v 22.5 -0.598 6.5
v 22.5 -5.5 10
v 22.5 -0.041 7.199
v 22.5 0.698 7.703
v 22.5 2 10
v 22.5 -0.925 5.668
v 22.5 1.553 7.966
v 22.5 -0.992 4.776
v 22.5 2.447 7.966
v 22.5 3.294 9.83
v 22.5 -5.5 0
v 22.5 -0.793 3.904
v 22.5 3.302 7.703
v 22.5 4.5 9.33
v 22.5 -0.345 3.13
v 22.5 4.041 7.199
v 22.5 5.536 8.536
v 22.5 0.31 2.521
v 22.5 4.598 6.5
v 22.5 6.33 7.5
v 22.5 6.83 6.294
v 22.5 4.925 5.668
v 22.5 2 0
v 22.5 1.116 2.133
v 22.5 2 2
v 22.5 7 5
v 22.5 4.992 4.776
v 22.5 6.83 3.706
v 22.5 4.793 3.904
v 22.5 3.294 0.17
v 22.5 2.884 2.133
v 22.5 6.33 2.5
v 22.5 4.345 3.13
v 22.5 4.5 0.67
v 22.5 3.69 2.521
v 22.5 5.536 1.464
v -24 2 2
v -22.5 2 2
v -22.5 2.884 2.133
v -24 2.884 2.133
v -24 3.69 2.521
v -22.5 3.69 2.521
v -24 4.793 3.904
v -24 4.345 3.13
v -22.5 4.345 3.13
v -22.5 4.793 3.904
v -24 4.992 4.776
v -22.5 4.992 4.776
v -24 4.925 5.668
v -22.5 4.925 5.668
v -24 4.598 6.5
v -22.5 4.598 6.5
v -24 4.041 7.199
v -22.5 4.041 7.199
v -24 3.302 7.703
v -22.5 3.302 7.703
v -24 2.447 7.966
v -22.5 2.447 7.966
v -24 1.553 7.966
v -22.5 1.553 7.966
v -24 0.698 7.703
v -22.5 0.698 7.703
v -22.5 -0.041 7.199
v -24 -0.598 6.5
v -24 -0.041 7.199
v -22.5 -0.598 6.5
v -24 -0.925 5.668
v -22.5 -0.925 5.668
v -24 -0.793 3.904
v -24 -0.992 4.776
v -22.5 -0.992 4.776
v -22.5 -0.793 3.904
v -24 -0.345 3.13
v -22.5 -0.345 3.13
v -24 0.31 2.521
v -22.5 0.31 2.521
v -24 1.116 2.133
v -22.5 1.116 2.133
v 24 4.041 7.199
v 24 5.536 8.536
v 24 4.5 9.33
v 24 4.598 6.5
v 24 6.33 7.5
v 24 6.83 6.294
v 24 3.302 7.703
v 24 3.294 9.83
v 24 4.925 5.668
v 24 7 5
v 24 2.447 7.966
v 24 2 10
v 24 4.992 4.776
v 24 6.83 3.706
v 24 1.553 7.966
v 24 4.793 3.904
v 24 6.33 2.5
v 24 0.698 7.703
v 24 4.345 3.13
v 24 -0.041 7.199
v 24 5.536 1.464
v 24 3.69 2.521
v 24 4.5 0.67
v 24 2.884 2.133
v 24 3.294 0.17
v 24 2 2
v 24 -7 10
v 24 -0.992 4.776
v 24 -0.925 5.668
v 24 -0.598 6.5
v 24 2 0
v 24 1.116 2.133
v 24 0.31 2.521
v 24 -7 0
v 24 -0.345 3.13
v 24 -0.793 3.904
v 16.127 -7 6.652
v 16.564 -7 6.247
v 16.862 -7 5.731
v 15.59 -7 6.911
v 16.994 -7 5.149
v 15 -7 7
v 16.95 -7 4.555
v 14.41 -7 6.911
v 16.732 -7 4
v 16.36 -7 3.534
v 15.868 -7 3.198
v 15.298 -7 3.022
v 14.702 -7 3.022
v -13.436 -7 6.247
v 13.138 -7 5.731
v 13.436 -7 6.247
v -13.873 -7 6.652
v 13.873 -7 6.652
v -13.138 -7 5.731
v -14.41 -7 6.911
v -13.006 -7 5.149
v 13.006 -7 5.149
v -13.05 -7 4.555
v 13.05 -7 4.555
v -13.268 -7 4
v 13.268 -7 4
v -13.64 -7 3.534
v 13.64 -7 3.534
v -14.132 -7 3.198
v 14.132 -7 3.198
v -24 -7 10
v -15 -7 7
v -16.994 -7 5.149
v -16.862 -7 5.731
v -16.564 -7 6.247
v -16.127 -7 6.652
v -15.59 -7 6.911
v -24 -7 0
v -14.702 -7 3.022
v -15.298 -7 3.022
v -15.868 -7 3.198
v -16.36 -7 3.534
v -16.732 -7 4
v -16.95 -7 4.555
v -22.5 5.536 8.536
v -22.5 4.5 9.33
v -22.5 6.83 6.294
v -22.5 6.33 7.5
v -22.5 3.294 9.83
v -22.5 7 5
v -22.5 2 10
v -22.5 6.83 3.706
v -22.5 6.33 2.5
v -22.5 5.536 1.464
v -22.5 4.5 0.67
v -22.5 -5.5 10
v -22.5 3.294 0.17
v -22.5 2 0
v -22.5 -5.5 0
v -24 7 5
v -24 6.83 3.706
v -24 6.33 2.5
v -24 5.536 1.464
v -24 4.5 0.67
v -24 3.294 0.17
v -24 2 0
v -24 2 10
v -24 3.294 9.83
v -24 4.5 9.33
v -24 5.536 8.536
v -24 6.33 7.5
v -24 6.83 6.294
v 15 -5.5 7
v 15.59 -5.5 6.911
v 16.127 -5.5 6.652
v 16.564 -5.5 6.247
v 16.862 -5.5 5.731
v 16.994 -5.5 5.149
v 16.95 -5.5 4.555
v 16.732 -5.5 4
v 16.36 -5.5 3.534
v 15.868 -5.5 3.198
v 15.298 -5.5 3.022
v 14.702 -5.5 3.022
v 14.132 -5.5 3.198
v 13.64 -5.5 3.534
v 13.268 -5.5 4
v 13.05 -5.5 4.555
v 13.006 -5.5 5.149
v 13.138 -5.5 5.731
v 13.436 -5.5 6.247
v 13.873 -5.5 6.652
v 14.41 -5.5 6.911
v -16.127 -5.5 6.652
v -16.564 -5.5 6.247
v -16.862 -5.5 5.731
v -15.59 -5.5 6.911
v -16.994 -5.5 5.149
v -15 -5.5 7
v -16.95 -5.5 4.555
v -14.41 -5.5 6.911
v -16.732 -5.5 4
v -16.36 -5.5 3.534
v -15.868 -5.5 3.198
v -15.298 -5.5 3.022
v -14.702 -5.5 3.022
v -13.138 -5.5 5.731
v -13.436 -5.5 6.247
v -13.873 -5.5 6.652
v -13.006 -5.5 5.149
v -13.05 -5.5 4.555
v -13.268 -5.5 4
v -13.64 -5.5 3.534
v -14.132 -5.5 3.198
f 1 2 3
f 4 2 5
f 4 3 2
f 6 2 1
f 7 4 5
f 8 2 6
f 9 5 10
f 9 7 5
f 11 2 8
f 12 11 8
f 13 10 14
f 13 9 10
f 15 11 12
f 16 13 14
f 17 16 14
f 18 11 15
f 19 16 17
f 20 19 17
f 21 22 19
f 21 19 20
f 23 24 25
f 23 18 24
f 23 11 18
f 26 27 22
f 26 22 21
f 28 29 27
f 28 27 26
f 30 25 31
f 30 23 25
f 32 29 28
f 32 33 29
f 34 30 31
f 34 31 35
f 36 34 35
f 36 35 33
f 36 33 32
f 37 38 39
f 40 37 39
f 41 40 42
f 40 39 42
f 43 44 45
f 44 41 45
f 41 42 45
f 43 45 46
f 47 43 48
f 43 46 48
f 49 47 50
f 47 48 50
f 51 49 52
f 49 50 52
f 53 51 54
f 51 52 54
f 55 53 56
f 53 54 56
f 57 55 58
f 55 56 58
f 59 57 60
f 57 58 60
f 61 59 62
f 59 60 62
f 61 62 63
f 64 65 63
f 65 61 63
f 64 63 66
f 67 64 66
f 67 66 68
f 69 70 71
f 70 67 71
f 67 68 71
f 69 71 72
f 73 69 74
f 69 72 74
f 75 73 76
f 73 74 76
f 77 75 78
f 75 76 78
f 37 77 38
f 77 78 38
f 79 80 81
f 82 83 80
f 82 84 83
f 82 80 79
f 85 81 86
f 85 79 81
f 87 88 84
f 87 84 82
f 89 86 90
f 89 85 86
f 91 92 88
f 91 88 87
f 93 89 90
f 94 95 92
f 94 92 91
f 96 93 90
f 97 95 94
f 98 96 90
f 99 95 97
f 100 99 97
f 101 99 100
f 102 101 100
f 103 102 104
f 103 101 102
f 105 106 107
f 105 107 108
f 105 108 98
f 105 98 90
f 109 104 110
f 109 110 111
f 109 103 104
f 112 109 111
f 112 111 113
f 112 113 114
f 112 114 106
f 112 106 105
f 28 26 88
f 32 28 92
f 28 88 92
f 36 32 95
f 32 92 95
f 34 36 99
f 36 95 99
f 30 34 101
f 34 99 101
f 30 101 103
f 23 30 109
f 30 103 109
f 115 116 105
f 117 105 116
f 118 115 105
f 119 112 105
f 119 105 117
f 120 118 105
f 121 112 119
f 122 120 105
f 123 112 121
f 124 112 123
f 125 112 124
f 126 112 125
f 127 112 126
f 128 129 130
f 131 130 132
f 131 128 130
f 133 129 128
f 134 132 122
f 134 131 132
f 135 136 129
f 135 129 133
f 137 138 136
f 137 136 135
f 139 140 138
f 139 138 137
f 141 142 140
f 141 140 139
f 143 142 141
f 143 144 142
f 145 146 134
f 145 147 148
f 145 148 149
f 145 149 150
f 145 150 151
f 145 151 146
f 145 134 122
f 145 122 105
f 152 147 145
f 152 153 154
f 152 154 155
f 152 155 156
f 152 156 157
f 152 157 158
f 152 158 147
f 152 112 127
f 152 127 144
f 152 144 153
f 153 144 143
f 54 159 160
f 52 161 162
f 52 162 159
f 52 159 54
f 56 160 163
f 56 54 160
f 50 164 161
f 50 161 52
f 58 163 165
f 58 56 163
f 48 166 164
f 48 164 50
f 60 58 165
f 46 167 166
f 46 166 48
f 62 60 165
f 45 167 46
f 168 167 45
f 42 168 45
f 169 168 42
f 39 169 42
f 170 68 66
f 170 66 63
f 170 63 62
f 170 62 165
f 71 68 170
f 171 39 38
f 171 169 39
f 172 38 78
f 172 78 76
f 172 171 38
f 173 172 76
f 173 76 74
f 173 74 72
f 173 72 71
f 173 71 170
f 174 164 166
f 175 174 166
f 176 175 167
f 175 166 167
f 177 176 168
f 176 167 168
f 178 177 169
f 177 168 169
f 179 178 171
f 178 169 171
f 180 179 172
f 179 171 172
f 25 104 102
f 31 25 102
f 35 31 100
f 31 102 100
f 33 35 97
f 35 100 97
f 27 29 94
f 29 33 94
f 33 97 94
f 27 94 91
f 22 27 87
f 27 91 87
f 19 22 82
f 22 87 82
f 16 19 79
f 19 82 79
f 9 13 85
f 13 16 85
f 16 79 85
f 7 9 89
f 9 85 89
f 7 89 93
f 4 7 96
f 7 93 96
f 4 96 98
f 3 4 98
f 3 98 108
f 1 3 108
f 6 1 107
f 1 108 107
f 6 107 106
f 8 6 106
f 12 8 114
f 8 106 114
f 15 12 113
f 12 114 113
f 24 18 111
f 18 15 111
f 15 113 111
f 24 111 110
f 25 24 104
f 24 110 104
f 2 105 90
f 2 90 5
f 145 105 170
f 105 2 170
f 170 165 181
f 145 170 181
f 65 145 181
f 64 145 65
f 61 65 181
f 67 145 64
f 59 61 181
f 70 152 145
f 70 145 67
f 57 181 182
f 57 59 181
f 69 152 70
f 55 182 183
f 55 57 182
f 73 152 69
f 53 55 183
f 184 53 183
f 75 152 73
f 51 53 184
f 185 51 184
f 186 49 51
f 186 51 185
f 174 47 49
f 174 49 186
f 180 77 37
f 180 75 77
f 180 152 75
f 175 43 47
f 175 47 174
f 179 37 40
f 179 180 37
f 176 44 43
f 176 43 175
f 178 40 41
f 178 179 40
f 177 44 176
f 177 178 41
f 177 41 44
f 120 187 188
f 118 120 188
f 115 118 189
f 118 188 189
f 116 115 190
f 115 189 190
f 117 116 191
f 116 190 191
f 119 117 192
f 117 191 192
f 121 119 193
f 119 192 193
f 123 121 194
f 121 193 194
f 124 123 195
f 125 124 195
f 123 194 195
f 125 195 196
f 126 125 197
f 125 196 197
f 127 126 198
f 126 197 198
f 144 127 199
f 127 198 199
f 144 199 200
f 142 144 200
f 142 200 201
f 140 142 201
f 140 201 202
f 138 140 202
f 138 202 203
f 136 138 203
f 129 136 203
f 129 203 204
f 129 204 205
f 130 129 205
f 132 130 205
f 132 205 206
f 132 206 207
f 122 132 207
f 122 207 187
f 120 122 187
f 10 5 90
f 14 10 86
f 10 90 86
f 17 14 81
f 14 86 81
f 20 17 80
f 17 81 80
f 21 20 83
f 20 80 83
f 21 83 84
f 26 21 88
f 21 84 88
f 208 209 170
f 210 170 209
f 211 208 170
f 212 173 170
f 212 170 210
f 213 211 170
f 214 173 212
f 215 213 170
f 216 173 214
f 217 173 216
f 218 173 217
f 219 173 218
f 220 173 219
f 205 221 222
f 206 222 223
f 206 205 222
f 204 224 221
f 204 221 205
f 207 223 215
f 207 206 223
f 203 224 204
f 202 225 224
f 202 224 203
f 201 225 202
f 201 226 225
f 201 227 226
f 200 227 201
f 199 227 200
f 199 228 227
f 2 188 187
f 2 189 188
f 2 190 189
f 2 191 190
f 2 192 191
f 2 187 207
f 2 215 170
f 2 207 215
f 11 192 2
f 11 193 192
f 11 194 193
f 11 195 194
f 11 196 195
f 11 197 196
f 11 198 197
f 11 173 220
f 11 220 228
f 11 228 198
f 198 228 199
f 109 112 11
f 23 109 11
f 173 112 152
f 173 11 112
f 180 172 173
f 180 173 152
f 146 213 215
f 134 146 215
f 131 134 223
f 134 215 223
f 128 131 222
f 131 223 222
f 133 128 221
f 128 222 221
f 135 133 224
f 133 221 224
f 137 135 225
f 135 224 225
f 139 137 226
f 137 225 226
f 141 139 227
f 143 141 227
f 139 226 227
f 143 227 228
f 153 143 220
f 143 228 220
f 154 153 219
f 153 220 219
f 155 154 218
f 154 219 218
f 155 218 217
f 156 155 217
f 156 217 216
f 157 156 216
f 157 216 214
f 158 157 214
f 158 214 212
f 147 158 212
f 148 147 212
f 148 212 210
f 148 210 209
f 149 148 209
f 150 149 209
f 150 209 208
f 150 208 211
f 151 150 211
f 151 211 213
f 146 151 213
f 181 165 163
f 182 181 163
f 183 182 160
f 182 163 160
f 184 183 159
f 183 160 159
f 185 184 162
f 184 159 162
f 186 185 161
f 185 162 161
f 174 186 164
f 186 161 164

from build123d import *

# Parameters (mm, degrees)
BOSS_EXTRUDE1_DEPTH = 10
CUT_EXTRUDE1_REACH  = 51.528
SKETCH3_R           = 2
CUT_EXTRUDE2_DEPTH  = 10


with BuildPart() as part:
    # Sketch1 → Boss-Extrude1 (new body)
    with BuildSketch(Plane.XY):
        Polygon((-22.5, 7), (-22.5, -5.5), (22.5, -5.5), (22.5, 7), (24, 7), (24, -7), (-24, -7), (-24, 7), align=None)
    extrude(amount=BOSS_EXTRUDE1_DEPTH)

    # Cut-Extrude1: up to this face of the body (flat: up to its plane)
    cut_extrude1_end = Plane(part.part.faces().sort_by_distance((-24, 0, 5))[0])
    # Sketch2 → Cut-Extrude1 (cut, up to the picked face)
    with BuildSketch(Plane(origin=(24, 0, 0), x_dir=(0, 0, -1), z_dir=(1, 0, 0)), mode=Mode.PRIVATE) as cut_extrude1_sk1:
        with BuildLine():
            ThreePointArc((-10, 2), (-8.535533906, 5.535533906), (-5, 7))
            Line((-5, 7), (-10, 7))
            Line((-10, 7), (-10, 2))
        make_face()
    cut_extrude1_tool1 = split(extrude(cut_extrude1_sk1.sketch, amount=-CUT_EXTRUDE1_REACH, mode=Mode.PRIVATE), bisect_by=cut_extrude1_end, keep=Keep.BOTH, mode=Mode.PRIVATE)
    # Sketch2 → Cut-Extrude1 (cut, up to the picked face)
    with BuildSketch(Plane(origin=(24, 0, 0), x_dir=(0, 0, -1), z_dir=(1, 0, 0)), mode=Mode.PRIVATE) as cut_extrude1_sk2:
        with BuildLine():
            ThreePointArc((-5, 7), (-1.464466094, 5.535533906), (0, 2))
            Line((0, 2), (0, 7))
            Line((0, 7), (-5, 7))
        make_face()
    cut_extrude1_tool2 = split(extrude(cut_extrude1_sk2.sketch, amount=-CUT_EXTRUDE1_REACH, mode=Mode.PRIVATE), bisect_by=cut_extrude1_end, keep=Keep.BOTH, mode=Mode.PRIVATE)
    # Sketch2 → Cut-Extrude1 (cut, up to the picked face)
    with BuildSketch(Plane(origin=(24, 0, 0), x_dir=(0, 0, -1), z_dir=(1, 0, 0)), mode=Mode.PRIVATE) as cut_extrude1_sk3:
        with BuildLine():
            ThreePointArc((-8, 2), (-5, -1), (-2, 2))
            Line((-2, 2), (-8, 2))
        make_face()
    cut_extrude1_tool3 = split(extrude(cut_extrude1_sk3.sketch, amount=-CUT_EXTRUDE1_REACH, mode=Mode.PRIVATE), bisect_by=cut_extrude1_end, keep=Keep.BOTH, mode=Mode.PRIVATE)
    # Sketch2 → Cut-Extrude1 (cut, up to the picked face)
    with BuildSketch(Plane(origin=(24, 0, 0), x_dir=(0, 0, -1), z_dir=(1, 0, 0)), mode=Mode.PRIVATE) as cut_extrude1_sk4:
        with BuildLine():
            Line((-8, 2), (-2, 2))
            ThreePointArc((-2, 2), (-5, 5), (-8, 2))
        make_face()
    cut_extrude1_tool4 = split(extrude(cut_extrude1_sk4.sketch, amount=-CUT_EXTRUDE1_REACH, mode=Mode.PRIVATE), bisect_by=cut_extrude1_end, keep=Keep.BOTH, mode=Mode.PRIVATE)
    # Sketch2 → Cut-Extrude1 (cut, up to the picked face)
    with BuildSketch(Plane(origin=(24, 0, 0), x_dir=(0, 0, -1), z_dir=(1, 0, 0)), mode=Mode.PRIVATE) as cut_extrude1_sk5:
        with BuildLine():
            ThreePointArc((-8, 2), (-5, -1), (-2, 2))
            Line((-2, 2), (-8, 2))
        make_face()
    cut_extrude1_tool5 = split(extrude(cut_extrude1_sk5.sketch, amount=-CUT_EXTRUDE1_REACH, mode=Mode.PRIVATE), bisect_by=cut_extrude1_end, keep=Keep.BOTH, mode=Mode.PRIVATE)
    # Sketch2 → Cut-Extrude1 (cut, up to the picked face)
    with BuildSketch(Plane(origin=(24, 0, 0), x_dir=(0, 0, -1), z_dir=(1, 0, 0)), mode=Mode.PRIVATE) as cut_extrude1_sk6:
        with BuildLine():
            Line((-8, 2), (-2, 2))
            ThreePointArc((-2, 2), (-5, 5), (-8, 2))
        make_face()
    cut_extrude1_tool6 = split(extrude(cut_extrude1_sk6.sketch, amount=-CUT_EXTRUDE1_REACH, mode=Mode.PRIVATE), bisect_by=cut_extrude1_end, keep=Keep.BOTH, mode=Mode.PRIVATE)
    add(cut_extrude1_tool1.solids().sort_by(Axis((24, 5.88316, 8.88316), (-1, 0, 0)))[0], mode=Mode.SUBTRACT)
    add(cut_extrude1_tool2.solids().sort_by(Axis((24, 5.88316, 1.11684), (-1, 0, 0)))[0], mode=Mode.SUBTRACT)
    add(cut_extrude1_tool3.solids().sort_by(Axis((24, 0.72676, 5), (-1, 0, 0)))[0], mode=Mode.SUBTRACT)
    add(cut_extrude1_tool4.solids().sort_by(Axis((24, 3.27324, 5), (-1, 0, 0)))[0], mode=Mode.SUBTRACT)
    add(cut_extrude1_tool5.solids().sort_by(Axis((24, 0.72676, 5), (-1, 0, 0)))[0], mode=Mode.SUBTRACT)
    add(cut_extrude1_tool6.solids().sort_by(Axis((24, 3.27324, 5), (-1, 0, 0)))[0], mode=Mode.SUBTRACT)

    # Sketch3 → Cut-Extrude2 (cut)
    with BuildSketch(Plane(origin=(0, -5.5, 0), x_dir=(1, 0, 0), z_dir=(0, 1, 0))):
        with Locations(Location((15, -5, 0), (0, 0, 270))):
            Circle(SKETCH3_R)
        with Locations(Location((-15, -5, 0), (0, 0, 270))):
            Circle(SKETCH3_R)
    extrude(amount=-CUT_EXTRUDE2_DEPTH, mode=Mode.SUBTRACT)


solid = part.part
